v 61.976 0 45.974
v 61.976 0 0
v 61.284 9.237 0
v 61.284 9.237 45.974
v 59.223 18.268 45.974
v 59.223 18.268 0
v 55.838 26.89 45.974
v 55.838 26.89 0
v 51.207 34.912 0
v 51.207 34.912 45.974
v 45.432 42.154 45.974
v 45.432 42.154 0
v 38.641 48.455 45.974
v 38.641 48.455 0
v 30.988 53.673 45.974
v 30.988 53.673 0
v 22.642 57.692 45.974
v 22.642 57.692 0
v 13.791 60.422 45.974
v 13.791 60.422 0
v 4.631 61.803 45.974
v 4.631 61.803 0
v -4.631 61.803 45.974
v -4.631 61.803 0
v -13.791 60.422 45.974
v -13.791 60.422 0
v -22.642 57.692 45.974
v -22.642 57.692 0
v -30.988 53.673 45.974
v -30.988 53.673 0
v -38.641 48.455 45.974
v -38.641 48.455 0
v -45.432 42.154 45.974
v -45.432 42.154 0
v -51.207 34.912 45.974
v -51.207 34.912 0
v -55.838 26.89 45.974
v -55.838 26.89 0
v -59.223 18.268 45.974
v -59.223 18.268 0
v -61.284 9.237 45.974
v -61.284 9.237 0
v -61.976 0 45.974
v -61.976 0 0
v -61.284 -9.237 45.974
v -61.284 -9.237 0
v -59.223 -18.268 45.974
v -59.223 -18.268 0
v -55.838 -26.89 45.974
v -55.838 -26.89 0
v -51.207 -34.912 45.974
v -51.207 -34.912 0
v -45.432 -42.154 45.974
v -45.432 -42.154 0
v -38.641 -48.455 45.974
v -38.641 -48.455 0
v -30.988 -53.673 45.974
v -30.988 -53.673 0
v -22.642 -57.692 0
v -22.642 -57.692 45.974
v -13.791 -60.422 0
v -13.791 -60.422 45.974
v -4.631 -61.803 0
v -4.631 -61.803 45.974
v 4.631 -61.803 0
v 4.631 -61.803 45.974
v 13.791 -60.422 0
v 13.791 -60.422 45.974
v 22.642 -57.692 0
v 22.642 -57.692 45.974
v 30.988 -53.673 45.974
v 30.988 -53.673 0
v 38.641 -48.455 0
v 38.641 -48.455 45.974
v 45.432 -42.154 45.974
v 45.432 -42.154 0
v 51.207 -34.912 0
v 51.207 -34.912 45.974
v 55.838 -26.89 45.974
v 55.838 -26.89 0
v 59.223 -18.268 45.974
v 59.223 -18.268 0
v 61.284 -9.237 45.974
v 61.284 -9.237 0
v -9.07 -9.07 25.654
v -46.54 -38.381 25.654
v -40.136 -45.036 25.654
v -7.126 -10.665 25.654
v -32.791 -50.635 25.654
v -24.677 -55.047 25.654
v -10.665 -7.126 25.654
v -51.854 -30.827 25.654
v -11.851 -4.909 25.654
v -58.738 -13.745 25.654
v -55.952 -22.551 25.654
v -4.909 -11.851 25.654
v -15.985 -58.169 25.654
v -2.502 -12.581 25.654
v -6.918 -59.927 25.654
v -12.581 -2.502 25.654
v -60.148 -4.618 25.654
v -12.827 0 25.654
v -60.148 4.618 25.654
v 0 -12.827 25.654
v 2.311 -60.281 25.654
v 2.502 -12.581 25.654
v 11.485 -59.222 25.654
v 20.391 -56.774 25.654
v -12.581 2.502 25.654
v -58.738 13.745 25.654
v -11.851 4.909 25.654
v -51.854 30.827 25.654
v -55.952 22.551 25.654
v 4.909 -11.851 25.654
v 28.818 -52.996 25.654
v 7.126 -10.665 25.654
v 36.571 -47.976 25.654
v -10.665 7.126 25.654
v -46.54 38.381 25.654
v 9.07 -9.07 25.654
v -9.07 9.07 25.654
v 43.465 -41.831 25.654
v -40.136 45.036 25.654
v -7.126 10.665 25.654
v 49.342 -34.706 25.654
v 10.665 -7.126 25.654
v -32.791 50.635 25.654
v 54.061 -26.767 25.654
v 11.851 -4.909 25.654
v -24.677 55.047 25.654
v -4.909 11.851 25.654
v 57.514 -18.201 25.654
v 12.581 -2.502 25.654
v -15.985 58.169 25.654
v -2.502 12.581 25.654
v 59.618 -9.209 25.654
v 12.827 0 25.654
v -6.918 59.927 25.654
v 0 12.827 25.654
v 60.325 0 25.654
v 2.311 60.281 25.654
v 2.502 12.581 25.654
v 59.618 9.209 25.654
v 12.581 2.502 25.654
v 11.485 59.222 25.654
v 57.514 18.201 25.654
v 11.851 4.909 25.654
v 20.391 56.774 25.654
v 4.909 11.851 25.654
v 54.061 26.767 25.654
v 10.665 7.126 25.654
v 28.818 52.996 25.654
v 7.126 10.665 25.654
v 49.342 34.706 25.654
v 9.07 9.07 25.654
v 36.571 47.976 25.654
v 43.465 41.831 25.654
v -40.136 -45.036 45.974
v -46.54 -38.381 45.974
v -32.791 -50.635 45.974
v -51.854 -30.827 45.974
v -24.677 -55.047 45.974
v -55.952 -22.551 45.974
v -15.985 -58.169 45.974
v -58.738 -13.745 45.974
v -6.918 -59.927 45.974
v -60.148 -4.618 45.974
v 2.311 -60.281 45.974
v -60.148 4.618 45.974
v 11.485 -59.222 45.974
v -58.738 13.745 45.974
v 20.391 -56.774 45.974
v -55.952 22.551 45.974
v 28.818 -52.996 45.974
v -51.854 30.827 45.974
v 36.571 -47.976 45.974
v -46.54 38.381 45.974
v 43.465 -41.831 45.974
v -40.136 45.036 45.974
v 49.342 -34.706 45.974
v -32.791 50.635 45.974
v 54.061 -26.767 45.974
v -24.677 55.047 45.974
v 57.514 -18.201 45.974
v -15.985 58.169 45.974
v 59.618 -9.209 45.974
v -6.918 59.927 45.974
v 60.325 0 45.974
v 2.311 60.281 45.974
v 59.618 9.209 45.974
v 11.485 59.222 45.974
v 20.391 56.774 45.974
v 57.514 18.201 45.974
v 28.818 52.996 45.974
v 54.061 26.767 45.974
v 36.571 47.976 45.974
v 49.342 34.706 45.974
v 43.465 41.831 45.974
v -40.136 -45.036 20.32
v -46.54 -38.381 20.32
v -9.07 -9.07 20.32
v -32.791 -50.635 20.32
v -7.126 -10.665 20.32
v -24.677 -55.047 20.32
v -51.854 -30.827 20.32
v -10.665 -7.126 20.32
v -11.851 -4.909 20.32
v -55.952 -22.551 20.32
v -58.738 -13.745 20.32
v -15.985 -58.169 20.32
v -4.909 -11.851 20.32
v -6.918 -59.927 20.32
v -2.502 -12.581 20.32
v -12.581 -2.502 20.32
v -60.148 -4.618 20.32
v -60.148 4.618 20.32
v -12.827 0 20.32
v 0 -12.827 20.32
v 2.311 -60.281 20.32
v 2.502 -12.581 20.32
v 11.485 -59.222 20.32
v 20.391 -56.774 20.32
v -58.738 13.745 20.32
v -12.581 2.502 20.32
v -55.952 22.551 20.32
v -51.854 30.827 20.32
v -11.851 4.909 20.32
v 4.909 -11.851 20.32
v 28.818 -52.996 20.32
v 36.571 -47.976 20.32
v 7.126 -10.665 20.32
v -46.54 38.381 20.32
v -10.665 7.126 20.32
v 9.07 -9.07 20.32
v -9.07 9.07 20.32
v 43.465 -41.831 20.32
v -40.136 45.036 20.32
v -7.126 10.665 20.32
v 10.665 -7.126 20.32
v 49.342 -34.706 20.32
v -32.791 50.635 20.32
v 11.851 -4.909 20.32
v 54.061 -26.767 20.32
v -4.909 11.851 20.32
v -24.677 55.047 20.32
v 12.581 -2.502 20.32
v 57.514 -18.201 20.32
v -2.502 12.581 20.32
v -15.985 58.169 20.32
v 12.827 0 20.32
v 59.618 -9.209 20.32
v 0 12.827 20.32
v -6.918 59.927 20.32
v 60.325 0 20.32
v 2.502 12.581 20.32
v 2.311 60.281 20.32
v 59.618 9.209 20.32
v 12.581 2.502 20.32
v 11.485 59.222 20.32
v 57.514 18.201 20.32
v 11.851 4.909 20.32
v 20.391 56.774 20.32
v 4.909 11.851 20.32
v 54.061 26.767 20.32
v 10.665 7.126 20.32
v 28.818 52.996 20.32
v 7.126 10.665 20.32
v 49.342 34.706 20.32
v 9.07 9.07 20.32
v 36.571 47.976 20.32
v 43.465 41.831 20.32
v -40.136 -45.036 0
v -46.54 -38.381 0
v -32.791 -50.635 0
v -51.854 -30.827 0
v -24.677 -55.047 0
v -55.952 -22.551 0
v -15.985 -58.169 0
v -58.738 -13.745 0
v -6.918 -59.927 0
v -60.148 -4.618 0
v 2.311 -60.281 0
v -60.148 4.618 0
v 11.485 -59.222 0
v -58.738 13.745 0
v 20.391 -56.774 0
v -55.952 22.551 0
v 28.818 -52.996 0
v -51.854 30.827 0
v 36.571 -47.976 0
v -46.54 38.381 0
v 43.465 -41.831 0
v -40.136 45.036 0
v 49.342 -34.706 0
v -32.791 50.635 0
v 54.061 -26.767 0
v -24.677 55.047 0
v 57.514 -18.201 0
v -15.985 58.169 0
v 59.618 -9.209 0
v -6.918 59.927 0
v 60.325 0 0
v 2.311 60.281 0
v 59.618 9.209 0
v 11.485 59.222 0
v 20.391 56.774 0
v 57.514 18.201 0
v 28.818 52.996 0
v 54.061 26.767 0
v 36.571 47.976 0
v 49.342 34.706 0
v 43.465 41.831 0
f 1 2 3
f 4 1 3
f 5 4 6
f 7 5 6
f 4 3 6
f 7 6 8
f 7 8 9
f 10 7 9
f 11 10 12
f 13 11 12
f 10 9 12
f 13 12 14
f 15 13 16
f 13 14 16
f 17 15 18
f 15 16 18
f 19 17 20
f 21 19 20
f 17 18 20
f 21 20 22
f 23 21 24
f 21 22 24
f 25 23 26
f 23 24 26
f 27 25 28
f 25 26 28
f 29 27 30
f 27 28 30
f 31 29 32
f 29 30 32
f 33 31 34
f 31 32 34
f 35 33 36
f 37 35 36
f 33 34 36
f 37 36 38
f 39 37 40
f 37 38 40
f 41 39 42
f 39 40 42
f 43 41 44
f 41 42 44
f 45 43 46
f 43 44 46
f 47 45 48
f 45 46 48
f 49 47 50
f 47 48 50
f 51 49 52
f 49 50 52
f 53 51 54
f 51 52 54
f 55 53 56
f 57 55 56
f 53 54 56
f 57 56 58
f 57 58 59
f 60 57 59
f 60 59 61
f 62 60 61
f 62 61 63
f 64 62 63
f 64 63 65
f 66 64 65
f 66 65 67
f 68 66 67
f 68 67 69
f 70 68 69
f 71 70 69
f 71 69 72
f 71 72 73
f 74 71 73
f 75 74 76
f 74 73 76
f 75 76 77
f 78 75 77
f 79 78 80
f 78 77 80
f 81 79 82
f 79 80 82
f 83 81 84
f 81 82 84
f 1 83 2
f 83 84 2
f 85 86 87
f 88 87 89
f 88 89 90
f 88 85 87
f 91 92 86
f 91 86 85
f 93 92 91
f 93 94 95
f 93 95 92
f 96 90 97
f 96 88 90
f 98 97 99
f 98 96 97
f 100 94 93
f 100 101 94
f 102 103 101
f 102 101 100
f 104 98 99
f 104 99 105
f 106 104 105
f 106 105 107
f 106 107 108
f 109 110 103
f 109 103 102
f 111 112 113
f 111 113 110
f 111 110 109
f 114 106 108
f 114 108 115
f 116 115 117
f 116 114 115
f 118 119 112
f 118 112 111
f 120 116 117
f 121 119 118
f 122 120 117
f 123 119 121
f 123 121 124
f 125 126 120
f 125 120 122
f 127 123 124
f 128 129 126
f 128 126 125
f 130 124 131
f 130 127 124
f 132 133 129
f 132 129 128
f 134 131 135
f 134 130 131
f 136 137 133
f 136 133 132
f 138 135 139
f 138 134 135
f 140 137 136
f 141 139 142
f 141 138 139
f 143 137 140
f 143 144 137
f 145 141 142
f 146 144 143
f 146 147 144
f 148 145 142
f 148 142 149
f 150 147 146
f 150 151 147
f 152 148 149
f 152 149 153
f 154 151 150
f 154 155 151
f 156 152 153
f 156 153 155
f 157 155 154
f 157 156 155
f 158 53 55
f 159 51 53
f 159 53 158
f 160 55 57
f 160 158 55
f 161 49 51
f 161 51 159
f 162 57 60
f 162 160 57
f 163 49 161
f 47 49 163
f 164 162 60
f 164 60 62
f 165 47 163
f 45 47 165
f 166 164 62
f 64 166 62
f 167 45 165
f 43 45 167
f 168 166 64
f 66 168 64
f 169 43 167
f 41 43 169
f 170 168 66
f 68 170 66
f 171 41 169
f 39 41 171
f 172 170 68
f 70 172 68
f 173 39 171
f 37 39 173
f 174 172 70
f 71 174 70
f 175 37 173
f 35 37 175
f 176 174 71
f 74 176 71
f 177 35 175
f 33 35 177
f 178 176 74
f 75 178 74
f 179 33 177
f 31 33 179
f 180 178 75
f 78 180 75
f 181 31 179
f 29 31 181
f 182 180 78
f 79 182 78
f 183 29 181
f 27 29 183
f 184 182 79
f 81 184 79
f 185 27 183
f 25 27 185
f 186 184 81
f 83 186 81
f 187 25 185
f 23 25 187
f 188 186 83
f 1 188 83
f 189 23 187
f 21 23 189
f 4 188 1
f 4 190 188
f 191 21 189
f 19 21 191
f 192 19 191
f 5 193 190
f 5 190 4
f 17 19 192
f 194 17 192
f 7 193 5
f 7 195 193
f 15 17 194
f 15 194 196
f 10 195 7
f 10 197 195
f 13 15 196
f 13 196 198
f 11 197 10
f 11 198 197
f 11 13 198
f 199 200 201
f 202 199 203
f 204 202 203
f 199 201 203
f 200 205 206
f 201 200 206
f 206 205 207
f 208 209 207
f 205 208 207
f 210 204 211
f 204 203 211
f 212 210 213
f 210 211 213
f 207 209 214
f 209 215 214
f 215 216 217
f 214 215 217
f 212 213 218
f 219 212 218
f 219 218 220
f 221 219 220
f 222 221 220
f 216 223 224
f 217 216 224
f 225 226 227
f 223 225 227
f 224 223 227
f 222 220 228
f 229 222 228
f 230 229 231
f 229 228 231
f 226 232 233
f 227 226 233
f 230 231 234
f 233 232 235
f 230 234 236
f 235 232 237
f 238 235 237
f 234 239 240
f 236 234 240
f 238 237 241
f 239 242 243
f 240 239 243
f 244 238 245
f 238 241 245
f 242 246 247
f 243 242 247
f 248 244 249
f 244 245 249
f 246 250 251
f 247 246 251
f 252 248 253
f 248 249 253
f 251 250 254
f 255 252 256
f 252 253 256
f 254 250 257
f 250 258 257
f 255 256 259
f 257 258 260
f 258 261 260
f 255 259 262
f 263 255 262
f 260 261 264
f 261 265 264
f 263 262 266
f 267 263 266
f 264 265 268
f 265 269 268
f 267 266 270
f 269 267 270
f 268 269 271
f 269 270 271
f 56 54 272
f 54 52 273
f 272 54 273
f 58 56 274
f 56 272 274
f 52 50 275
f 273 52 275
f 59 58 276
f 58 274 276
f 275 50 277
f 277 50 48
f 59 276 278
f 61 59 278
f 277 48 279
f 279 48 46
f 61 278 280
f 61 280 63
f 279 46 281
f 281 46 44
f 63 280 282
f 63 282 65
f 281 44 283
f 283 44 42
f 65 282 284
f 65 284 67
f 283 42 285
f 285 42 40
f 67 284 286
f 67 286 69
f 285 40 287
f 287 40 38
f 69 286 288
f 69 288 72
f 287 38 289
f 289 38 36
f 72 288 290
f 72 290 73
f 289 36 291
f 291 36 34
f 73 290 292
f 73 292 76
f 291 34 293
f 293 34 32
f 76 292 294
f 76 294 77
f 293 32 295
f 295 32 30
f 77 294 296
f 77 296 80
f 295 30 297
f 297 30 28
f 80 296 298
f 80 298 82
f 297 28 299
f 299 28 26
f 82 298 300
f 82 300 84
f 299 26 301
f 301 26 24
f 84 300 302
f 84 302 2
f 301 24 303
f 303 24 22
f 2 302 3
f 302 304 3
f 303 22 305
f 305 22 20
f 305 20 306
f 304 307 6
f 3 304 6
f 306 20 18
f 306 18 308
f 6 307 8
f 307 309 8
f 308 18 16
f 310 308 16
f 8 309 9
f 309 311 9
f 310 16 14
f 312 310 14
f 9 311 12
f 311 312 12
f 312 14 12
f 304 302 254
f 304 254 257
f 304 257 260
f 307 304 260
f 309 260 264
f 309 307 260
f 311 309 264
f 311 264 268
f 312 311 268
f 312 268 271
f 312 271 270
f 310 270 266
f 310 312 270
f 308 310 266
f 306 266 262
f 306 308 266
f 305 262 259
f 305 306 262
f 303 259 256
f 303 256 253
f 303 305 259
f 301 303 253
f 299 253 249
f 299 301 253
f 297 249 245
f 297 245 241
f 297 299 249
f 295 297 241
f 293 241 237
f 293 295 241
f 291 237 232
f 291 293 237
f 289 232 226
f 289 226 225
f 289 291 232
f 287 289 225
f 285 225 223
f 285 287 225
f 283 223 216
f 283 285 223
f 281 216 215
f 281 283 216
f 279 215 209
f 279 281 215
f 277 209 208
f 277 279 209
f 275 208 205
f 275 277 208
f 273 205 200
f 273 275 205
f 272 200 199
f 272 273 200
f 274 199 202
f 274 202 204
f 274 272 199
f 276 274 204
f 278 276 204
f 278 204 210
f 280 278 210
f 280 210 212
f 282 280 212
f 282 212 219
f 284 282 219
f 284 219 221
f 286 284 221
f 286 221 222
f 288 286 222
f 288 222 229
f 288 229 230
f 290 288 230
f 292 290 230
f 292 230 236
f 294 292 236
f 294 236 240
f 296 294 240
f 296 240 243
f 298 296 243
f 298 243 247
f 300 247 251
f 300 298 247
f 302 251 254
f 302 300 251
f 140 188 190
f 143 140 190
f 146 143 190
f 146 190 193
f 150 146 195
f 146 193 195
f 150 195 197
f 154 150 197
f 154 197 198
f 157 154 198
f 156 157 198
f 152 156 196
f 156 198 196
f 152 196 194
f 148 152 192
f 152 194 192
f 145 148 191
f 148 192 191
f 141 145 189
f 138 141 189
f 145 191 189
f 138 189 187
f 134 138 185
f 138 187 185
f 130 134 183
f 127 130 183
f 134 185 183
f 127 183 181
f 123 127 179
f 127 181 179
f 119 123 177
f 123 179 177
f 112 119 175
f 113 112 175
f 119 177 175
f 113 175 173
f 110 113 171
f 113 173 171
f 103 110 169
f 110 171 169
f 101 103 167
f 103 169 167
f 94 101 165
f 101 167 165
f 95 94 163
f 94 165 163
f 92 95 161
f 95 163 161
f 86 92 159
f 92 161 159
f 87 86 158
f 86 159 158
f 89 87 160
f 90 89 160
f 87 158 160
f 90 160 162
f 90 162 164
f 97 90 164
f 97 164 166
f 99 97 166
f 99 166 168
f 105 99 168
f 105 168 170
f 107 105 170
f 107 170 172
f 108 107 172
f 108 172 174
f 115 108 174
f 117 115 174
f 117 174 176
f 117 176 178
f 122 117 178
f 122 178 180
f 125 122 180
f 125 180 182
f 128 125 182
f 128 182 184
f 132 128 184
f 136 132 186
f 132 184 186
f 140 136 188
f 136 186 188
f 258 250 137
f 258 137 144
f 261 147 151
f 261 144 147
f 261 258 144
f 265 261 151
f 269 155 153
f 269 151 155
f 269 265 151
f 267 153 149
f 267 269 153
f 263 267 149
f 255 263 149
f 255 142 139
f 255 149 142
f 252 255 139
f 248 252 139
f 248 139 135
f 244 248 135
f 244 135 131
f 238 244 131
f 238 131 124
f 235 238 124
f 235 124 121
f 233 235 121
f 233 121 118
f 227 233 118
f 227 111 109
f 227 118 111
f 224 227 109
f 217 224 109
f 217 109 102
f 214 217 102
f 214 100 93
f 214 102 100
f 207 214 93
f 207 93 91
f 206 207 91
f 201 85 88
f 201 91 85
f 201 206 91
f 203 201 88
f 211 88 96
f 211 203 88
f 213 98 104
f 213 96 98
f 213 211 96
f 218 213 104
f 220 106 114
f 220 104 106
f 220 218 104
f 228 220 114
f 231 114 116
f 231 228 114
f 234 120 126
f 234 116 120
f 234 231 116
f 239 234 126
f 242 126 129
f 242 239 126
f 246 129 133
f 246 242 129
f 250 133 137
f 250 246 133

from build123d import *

# Parameters (mm, degrees)
SKETCH1_R           = 61.976
SKETCH1_R_2         = 12.827
BOSS_EXTRUDE1_DEPTH = 45.974
SKETCH2_R           = 60.325
CUT_EXTRUDE1_DEPTH  = 20.32


with BuildPart() as part:
    # Sketch1 → Boss-Extrude1 (new body)
    with BuildSketch(Plane.XY):
        Circle(SKETCH1_R)
        Circle(SKETCH1_R_2, mode=Mode.SUBTRACT)
    extrude(amount=BOSS_EXTRUDE1_DEPTH)

    # Sketch2 → Cut-Extrude1 (cut)
    with BuildSketch(Plane.XY):
        Circle(SKETCH2_R)
    cut_extrude1 = extrude(amount=CUT_EXTRUDE1_DEPTH, mode=Mode.SUBTRACT)

    # Mirror1: Cut-Extrude1 across plane
    add(cut_extrude1.mirror(Plane.XY.offset(22.987)), mode=Mode.SUBTRACT)


solid = part.part
